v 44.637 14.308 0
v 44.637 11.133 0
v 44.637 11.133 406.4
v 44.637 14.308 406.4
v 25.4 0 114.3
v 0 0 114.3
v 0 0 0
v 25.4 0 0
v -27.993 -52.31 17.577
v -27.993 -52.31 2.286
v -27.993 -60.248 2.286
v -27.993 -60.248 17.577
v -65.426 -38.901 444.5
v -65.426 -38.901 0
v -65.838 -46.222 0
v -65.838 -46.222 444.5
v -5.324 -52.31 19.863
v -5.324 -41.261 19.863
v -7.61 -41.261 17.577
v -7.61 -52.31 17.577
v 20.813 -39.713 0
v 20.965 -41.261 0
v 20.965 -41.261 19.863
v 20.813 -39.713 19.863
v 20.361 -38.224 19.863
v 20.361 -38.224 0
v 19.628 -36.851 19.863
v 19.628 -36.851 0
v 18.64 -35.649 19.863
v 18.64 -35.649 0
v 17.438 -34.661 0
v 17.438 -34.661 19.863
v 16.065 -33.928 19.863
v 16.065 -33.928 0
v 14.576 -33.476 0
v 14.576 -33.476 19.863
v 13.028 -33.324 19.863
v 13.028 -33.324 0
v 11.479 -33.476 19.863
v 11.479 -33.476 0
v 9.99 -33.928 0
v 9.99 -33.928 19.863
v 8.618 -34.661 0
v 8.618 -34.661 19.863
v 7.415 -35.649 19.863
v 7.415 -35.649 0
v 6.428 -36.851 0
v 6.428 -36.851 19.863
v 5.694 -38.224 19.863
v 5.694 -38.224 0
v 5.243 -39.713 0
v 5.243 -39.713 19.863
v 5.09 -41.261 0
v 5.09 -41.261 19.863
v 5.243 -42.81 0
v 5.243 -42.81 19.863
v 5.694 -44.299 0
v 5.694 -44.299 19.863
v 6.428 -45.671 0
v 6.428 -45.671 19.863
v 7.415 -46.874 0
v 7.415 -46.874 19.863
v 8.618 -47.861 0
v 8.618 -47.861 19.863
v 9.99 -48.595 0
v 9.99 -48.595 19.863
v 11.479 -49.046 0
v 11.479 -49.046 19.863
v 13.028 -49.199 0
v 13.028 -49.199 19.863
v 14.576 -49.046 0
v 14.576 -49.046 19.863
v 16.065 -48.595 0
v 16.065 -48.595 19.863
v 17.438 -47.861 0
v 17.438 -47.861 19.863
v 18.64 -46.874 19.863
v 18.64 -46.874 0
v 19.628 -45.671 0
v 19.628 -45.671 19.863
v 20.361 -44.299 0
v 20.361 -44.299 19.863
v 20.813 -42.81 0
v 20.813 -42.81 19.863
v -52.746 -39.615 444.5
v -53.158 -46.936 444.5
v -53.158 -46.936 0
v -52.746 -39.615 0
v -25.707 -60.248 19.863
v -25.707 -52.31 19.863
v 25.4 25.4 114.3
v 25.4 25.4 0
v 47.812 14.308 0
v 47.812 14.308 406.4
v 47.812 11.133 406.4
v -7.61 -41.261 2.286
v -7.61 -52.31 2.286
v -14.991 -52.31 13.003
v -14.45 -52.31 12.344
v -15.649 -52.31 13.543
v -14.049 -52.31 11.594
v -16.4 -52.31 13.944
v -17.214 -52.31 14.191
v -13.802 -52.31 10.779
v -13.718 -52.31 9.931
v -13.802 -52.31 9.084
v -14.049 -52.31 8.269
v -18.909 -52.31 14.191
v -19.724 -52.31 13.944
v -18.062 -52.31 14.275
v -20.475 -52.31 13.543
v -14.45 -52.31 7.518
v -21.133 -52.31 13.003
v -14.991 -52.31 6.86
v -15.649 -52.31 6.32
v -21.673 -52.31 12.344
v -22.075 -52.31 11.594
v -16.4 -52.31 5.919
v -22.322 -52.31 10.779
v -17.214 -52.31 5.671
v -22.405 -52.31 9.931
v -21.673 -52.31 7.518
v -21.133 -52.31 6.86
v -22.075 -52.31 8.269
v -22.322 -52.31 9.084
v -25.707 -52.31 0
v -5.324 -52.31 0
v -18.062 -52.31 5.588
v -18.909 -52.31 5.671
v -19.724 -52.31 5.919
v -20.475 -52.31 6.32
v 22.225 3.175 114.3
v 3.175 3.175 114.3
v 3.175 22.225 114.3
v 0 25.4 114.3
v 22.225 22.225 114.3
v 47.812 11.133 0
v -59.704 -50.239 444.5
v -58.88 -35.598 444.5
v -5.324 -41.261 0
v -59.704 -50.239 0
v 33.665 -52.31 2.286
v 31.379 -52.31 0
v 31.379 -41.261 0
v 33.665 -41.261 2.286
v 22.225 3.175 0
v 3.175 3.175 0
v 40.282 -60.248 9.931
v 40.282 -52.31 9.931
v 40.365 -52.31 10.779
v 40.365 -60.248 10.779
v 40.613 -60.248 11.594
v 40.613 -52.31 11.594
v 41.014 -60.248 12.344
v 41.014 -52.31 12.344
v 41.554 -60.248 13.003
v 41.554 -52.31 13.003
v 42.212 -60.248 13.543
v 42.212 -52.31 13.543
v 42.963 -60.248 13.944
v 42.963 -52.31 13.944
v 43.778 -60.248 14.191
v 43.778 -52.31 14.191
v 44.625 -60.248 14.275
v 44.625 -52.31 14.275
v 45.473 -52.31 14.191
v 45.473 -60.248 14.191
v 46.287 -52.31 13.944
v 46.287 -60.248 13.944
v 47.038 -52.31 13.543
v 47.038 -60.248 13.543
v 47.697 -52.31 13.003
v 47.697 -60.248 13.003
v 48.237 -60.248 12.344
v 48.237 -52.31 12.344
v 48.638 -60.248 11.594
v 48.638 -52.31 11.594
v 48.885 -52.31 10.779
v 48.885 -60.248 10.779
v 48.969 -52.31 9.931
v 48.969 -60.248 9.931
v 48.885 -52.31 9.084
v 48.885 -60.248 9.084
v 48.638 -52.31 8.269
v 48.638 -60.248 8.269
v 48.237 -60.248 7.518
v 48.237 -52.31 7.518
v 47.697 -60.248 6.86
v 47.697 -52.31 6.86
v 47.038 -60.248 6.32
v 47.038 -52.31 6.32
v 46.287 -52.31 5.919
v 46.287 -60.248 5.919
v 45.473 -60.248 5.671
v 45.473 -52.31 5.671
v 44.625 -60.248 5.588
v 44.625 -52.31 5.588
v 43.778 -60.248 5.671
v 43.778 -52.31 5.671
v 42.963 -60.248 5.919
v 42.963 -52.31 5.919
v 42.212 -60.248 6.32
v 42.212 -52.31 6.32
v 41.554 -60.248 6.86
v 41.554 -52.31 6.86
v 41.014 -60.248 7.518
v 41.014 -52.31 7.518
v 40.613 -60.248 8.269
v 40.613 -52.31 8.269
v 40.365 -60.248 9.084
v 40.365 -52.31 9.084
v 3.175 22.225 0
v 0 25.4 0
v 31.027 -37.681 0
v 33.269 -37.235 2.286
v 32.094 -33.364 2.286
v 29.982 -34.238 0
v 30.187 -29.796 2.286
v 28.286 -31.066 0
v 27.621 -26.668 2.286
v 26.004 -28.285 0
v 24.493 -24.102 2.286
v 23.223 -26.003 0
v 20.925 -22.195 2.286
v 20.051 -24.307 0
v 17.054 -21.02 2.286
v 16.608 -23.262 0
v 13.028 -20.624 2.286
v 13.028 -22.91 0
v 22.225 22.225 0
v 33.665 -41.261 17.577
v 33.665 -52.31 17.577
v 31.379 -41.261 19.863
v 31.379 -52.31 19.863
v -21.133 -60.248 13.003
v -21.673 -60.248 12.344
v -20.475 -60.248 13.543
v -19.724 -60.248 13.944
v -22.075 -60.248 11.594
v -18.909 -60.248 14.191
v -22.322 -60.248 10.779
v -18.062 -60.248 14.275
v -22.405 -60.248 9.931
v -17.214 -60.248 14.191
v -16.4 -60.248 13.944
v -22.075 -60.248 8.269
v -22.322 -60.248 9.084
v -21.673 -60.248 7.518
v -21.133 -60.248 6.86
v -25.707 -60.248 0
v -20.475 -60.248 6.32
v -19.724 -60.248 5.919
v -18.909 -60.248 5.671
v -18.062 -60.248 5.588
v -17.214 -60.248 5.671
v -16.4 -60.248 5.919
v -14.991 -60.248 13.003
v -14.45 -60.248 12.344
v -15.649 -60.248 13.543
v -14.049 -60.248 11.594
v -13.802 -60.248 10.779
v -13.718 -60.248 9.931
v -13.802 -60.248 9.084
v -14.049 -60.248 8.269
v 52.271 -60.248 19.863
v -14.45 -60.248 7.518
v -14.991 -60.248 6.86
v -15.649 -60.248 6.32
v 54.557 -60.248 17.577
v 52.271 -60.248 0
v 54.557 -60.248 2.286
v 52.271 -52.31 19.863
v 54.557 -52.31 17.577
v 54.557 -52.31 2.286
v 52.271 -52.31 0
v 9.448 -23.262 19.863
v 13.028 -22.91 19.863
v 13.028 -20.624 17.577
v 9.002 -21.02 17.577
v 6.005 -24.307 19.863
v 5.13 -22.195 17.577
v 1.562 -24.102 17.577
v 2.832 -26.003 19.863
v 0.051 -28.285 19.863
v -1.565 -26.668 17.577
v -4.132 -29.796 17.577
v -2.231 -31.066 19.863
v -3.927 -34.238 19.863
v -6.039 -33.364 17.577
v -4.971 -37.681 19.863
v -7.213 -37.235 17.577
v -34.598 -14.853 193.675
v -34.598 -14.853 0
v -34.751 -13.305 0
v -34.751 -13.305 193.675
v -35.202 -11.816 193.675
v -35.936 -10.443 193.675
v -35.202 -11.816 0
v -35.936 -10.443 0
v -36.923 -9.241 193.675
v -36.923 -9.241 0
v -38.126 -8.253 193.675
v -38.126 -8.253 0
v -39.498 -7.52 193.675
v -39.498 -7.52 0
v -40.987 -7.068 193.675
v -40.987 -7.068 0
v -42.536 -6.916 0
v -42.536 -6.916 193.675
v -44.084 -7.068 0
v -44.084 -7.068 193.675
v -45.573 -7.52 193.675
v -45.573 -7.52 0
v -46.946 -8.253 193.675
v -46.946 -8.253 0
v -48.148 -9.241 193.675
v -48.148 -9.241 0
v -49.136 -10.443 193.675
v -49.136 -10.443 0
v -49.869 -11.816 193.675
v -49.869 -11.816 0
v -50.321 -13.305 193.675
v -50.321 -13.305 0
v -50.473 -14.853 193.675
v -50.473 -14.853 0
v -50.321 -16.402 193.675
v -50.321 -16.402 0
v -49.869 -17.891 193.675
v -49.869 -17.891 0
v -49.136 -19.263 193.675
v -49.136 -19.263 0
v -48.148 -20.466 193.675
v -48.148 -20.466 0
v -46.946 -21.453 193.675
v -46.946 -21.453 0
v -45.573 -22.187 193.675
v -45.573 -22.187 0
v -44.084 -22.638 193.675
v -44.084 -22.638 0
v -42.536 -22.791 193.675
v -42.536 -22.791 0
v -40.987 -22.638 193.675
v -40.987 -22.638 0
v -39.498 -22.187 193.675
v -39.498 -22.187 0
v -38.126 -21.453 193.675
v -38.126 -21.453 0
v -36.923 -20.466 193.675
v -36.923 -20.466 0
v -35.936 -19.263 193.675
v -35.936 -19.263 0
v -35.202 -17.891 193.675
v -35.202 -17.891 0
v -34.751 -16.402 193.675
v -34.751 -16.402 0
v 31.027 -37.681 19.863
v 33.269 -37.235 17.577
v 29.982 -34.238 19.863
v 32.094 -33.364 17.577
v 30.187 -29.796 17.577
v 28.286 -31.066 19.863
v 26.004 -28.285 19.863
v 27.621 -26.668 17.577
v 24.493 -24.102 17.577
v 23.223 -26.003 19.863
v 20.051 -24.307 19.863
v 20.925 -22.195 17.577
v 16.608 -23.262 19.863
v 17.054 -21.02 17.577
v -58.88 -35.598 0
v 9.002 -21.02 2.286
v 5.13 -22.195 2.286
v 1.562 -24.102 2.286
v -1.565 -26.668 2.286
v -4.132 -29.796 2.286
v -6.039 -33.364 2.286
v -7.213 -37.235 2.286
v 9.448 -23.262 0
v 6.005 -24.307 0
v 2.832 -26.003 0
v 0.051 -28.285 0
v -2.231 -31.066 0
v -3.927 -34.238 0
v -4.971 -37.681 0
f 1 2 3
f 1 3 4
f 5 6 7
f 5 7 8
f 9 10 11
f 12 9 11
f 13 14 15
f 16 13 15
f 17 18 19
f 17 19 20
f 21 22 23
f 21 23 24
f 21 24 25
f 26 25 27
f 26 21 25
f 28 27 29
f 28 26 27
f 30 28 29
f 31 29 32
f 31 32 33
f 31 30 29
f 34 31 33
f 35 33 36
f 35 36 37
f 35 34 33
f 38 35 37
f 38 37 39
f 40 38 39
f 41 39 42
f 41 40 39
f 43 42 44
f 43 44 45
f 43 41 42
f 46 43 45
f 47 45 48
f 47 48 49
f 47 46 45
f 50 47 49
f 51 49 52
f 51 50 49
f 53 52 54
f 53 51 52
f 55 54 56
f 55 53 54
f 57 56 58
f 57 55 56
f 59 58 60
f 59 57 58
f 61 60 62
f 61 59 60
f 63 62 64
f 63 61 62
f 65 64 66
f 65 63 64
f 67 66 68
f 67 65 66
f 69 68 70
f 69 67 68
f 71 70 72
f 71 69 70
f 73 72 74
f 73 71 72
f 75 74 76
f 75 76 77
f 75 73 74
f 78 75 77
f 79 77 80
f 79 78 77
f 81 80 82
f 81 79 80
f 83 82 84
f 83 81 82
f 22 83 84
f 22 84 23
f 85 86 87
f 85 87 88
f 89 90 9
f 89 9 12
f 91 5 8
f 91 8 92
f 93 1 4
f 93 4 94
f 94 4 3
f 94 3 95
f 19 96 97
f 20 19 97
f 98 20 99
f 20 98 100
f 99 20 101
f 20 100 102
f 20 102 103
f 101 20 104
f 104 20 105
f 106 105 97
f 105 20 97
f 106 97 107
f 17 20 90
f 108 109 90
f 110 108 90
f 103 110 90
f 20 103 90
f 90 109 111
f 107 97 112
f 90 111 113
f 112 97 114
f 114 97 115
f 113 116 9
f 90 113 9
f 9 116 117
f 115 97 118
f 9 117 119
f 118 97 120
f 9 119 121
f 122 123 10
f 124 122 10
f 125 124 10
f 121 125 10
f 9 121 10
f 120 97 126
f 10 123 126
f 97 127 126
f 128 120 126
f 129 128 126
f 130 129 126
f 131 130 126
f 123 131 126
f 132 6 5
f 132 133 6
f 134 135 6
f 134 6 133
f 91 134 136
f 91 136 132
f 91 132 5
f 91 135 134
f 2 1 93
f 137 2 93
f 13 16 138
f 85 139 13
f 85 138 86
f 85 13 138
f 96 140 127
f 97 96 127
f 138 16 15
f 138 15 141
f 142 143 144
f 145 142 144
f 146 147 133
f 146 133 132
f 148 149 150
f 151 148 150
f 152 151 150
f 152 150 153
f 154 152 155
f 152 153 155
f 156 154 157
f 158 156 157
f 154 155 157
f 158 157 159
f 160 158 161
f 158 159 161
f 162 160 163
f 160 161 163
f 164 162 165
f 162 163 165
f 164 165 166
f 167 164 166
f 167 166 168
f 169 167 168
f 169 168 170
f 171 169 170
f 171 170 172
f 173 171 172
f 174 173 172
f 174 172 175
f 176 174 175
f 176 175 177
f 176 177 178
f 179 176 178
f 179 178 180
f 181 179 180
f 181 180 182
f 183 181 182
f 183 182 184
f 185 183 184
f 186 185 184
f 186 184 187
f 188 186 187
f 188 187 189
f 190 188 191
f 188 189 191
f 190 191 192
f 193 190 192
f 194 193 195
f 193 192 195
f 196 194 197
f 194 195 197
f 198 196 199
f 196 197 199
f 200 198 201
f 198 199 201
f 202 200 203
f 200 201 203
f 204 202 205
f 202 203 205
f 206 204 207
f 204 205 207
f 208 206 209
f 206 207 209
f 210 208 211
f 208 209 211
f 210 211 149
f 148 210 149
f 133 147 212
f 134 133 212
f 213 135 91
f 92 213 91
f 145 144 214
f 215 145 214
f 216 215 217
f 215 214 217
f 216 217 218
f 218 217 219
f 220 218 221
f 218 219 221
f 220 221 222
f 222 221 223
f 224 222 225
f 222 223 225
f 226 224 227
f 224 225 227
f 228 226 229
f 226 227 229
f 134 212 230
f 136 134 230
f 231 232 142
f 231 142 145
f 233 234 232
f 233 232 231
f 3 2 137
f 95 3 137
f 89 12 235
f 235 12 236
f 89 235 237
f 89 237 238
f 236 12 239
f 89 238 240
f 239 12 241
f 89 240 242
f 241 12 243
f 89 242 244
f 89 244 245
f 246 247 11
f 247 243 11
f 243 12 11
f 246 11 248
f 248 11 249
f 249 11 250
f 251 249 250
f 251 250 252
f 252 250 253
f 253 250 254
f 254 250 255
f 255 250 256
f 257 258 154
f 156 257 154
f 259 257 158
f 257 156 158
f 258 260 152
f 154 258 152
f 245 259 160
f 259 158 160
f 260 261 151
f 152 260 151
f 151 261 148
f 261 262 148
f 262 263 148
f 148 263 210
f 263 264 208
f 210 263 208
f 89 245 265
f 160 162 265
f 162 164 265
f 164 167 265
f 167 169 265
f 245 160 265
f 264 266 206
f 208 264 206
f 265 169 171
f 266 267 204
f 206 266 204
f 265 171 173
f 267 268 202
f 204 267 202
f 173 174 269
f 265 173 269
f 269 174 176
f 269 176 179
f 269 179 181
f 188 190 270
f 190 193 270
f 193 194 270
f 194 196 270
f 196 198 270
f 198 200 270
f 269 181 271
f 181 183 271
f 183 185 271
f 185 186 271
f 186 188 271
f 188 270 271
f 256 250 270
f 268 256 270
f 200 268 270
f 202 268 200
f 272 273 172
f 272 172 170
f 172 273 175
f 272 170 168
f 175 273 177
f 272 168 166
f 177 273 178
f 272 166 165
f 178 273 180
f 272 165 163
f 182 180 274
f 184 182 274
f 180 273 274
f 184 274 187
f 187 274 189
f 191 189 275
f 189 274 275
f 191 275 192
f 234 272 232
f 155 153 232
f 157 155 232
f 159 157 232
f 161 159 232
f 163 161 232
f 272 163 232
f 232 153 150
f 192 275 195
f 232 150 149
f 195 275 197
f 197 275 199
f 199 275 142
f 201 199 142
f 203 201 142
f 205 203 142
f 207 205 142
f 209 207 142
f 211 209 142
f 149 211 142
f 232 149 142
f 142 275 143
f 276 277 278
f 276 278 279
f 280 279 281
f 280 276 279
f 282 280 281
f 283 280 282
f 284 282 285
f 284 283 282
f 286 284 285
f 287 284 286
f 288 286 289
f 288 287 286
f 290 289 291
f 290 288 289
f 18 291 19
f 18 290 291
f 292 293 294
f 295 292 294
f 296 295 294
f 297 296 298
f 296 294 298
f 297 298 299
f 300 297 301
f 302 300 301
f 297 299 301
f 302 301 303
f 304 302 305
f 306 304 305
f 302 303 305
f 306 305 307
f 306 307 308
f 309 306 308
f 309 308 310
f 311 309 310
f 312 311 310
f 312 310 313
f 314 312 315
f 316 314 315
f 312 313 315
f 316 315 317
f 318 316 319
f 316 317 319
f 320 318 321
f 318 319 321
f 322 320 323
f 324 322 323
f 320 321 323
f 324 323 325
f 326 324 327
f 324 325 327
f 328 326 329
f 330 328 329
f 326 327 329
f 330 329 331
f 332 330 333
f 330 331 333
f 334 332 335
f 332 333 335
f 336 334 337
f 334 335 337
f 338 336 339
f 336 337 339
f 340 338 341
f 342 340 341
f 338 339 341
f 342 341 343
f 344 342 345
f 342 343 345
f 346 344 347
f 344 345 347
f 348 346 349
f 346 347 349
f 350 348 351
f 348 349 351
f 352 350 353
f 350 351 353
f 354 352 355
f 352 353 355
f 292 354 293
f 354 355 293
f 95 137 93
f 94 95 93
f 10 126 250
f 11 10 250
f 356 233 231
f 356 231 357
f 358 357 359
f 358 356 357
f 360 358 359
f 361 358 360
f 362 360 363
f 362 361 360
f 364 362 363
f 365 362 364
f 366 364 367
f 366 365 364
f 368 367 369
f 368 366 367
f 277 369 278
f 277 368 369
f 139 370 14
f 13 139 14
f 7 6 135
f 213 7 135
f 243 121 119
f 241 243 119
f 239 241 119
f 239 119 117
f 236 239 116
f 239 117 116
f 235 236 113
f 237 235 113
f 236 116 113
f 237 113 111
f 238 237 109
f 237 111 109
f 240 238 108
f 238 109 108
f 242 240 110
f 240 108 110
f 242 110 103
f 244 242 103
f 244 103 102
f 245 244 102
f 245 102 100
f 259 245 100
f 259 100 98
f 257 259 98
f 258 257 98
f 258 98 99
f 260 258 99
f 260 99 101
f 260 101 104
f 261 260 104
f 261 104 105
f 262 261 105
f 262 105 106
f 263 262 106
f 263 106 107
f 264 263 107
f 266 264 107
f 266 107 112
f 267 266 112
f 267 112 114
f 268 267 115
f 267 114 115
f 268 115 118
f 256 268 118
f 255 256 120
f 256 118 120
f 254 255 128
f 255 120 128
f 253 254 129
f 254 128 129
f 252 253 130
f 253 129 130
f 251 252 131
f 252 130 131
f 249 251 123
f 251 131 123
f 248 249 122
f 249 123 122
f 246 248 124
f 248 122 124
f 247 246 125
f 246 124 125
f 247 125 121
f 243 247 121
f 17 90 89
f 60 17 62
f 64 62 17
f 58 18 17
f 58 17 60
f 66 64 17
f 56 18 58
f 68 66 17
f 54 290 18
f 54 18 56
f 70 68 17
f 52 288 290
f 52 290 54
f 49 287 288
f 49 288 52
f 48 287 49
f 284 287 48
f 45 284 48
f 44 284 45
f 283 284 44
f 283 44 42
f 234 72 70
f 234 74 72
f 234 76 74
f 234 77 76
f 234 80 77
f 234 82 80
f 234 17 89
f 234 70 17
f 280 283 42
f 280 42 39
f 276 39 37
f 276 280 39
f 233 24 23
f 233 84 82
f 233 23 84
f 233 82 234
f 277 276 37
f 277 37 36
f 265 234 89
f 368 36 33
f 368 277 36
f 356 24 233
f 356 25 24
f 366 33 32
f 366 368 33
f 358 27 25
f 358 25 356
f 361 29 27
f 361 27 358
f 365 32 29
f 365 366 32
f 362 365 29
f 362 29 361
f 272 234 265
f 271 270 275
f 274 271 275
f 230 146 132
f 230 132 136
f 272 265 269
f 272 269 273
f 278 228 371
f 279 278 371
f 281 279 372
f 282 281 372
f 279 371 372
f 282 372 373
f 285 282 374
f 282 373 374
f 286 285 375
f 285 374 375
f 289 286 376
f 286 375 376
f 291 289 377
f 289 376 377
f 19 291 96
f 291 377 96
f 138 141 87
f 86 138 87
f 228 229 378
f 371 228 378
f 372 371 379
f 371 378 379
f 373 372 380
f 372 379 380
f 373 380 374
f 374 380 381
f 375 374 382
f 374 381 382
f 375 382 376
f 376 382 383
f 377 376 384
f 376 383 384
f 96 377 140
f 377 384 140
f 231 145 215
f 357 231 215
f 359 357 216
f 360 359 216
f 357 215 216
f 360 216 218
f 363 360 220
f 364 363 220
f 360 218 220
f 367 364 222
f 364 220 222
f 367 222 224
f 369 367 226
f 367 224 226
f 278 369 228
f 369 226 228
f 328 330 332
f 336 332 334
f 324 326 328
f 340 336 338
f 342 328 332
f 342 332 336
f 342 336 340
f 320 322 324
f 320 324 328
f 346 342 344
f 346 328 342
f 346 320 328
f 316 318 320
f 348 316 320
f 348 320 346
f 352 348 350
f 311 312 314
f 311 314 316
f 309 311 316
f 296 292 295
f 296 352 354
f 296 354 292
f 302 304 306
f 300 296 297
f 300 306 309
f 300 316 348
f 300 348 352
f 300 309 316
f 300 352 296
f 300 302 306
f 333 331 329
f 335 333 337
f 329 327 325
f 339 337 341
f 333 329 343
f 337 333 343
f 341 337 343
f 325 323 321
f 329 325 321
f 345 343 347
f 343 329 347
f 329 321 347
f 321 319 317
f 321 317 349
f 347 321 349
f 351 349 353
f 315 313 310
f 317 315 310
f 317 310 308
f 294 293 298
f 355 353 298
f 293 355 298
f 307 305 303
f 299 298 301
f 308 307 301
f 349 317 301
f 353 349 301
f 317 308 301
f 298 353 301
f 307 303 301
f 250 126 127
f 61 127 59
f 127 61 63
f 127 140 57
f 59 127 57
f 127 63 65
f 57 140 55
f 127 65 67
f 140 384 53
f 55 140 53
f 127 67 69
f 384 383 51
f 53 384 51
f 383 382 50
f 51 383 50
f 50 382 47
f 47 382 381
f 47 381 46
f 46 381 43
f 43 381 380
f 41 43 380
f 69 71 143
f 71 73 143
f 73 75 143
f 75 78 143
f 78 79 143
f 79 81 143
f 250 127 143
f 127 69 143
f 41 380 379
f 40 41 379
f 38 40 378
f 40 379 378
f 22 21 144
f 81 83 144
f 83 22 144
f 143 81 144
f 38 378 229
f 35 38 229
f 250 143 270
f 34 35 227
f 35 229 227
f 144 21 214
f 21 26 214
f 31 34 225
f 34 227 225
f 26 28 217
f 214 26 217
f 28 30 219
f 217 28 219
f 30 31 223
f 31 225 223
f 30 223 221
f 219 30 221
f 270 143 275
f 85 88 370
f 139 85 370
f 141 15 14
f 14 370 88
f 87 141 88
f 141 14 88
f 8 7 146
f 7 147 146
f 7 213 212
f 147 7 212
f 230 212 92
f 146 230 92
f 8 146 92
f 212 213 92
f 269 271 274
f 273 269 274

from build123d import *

# Parameters (mm, degrees)
F0_W      = 25.4
F0_H      = 25.4
F0_W_2    = 19.05
F0_H_2    = 19.05
F1_DEPTH  = 114.3
F2_R      = 7.9375
F3_DEPTH  = 193.675
F4_R      = 7.9375
F5_DEPTH  = 19.8628
F6_SIZE   = 2.286
F7_R      = 4.3434
F8_DEPTH  = 25.4
F10_DEPTH = 444.5
F11_W     = 3.175
F11_H     = 3.175
F12_DEPTH = 406.4


with BuildPart() as f1:
    # F0 (on Top) → F1 (new body)
    with BuildSketch(Plane.XY):
        with Locations((12.7, 12.7)):
            Rectangle(F0_W, F0_H)
        with Locations((12.7, 12.7)):
            Rectangle(F0_W_2, F0_H_2, mode=Mode.SUBTRACT)
    extrude(amount=F1_DEPTH)


with BuildPart() as f3:
    # F2 (on Top) → F3 (new body)
    with BuildSketch(Plane.XY):
        with Locations((-42.535778, -14.853209)):
            Circle(F2_R)
    extrude(amount=F3_DEPTH)


with BuildPart() as f5:
    # F4 (on Top) → F5 (new body)
    with BuildSketch(Plane.XY):
        with BuildLine():
            Line((-27.993253, -52.310219), (-27.993253, -60.247719))
            Line((-27.993253, -60.247719), (54.556747, -60.247719))
            Line((54.556747, -60.247719), (54.556747, -52.310219))
            Line((54.556747, -52.310219), (33.665247, -52.310219))
            Line((33.665247, -52.310219), (33.665247, -41.261219))
            ThreePointArc((33.665247, -41.261219), (27.620664, -26.668303), (13.027747, -20.623719))
            ThreePointArc((13.027747, -20.623719), (-1.565169, -26.668303), (-7.609753, -41.261219))
            Line((-7.609753, -41.261219), (-7.609753, -52.310219))
            Line((-7.609753, -52.310219), (-27.993253, -52.310219))
        make_face()
        with Locations((13.027747, -41.261219)):
            Circle(F4_R, mode=Mode.SUBTRACT)
    extrude(amount=F5_DEPTH)

    # F6
    f6_edges = [f5.edges().sort_by_distance(p)[0] for p in [
        (13.027747, -20.623719, 19.8628),
        (-7.609753, -46.785719, 19.8628),
        (33.665247, -46.785719, 19.8628),
        (33.665247, -46.785719, 0),
        (13.027747, -20.623719, 0),
        (-7.609753, -46.785719, 0),
        (54.556747, -56.278969, 0),
        (54.556747, -56.278969, 19.8628),
        (-27.993253, -56.278969, 0),
        (-27.993253, -56.278969, 19.8628),
    ]]
    chamfer(f6_edges, length=F6_SIZE)

    # F7 (on face) → F8 (cut)
    with BuildSketch(Plane(origin=(0, -52.310219, 0), x_dir=(-1, 0, 0), z_dir=(0, 1, 0))):
        with Locations((-44.625347, 9.9314)):
            Circle(F7_R)
        with Locations((18.061853, 9.9314)):
            Circle(F7_R)
    extrude(amount=-F8_DEPTH, mode=Mode.SUBTRACT)


with BuildPart() as f10:
    # F9 (on Top) → F10 (new body)
    with BuildSketch(Plane.XY):
        Polygon((-52.745854, -39.615137), (-58.879709, -35.59778), (-65.425769, -38.901177), (-65.837975, -46.221929), (-59.704119, -50.239286), (-53.158059, -46.93589), align=None)
    extrude(amount=F10_DEPTH)


with BuildPart() as f12:
    # F11 (on Top) → F12 (new body)
    with BuildSketch(Plane.XY):
        with Locations((46.224038, 12.720798)):
            Rectangle(F11_W, F11_H)
    extrude(amount=F12_DEPTH)


solid = Compound([f1.part, f3.part, f5.part, f10.part, f12.part])
